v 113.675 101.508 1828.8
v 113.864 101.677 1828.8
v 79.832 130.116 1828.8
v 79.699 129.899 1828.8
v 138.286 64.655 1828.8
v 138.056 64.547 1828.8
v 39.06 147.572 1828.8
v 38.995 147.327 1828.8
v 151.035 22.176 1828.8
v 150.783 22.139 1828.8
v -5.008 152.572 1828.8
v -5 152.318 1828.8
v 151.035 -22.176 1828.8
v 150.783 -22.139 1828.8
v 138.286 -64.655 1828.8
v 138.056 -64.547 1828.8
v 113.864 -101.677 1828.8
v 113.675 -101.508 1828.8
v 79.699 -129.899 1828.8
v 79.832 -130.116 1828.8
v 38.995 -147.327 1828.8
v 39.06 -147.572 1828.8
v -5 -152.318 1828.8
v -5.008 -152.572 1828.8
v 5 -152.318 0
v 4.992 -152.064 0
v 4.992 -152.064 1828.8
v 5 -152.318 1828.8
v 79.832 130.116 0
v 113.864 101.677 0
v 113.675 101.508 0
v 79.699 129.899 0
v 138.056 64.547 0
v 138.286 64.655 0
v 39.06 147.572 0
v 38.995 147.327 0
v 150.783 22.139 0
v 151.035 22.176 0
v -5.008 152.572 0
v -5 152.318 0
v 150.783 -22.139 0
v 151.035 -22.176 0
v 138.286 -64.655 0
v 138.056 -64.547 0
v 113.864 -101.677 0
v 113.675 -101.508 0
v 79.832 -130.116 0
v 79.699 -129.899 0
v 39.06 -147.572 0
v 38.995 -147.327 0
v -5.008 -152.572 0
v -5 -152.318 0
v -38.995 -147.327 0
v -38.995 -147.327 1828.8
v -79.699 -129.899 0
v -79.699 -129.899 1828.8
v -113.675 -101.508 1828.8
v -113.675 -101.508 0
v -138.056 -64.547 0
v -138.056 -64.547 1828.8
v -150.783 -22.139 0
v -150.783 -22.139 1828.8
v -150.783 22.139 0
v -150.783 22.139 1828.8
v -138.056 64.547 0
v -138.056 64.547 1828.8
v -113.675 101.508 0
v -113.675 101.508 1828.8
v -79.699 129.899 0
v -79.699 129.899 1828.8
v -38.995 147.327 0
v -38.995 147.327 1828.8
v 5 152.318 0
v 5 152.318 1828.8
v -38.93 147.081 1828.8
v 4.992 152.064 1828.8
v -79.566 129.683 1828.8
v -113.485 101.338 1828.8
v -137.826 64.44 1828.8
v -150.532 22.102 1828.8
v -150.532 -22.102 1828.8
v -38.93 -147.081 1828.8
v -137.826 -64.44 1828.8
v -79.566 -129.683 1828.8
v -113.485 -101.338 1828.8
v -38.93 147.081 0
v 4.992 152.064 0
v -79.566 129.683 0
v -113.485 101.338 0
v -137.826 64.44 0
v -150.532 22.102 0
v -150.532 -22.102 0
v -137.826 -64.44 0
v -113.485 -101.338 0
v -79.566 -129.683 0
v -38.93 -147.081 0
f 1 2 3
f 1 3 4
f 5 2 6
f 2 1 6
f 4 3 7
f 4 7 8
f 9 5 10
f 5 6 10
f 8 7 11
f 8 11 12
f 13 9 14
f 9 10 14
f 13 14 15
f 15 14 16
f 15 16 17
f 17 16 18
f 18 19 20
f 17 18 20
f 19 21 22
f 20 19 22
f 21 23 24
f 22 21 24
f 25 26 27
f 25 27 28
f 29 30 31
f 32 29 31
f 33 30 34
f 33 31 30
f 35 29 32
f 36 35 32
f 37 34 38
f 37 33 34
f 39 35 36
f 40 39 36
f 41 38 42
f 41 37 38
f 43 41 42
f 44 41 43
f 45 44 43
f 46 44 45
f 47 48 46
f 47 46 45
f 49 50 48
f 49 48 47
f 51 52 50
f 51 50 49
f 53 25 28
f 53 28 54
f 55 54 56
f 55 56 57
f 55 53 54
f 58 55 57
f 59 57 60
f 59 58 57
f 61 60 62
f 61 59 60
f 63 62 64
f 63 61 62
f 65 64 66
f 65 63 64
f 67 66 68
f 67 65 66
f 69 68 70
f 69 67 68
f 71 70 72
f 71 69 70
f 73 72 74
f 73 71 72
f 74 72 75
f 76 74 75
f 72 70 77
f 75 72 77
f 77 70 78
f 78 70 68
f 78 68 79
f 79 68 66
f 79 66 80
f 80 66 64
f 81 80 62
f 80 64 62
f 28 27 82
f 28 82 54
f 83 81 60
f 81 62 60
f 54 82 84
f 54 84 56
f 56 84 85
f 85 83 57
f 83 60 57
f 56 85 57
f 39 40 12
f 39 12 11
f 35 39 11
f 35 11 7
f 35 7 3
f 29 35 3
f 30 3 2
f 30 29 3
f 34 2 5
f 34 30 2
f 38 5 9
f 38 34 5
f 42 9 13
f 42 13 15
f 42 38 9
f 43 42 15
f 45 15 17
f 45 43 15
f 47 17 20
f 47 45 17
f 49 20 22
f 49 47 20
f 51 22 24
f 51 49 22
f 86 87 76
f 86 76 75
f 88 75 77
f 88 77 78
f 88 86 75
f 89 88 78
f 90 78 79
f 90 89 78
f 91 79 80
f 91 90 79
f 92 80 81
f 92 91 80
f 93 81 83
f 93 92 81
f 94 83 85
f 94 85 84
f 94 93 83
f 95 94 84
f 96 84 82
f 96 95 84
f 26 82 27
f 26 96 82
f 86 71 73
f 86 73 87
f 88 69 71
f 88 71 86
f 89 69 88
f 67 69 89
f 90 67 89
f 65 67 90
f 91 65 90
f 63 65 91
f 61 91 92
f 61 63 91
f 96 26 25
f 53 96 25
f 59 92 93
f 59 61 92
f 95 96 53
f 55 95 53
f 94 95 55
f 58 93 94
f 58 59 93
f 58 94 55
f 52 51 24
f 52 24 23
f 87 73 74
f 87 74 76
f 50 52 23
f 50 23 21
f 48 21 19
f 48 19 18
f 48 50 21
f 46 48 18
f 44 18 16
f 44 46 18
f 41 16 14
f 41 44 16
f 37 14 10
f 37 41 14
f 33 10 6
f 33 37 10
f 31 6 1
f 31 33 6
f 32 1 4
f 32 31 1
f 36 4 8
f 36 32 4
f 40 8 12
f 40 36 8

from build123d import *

# Parameters (mm, degrees)
EXTRUDE_THIN4_DEPTH = 1828.8
EXTRUDE_THIN5_DEPTH = 1828.8


with BuildPart() as part:
    # Sketch4 → Extrude-Thin4 (new body)
    with BuildSketch(Plane(origin=(0, 0, 0), x_dir=(0, 1, 0), z_dir=(0, 0, 1))):
        with BuildLine():
            ThreePointArc((-152.317956919, -5), (0, 152.4), (152.317956919, -5))
            Line((152.317956919, -5), (152.064093658, -4.991666667))
            ThreePointArc((152.064093658, -4.991666667), (0, 152.146), (-152.064093658, -4.991666667))
            Line((-152.064093658, -4.991666667), (-152.317956919, -5))
        make_face()
    extrude(amount=EXTRUDE_THIN4_DEPTH)


with BuildPart() as body_2:
    # Sketch4<4> → Extrude-Thin5 (new body)
    with BuildSketch(Plane(origin=(0, 0, 0), x_dir=(0, 1, 0), z_dir=(0, 0, 1))):
        with BuildLine():
            ThreePointArc((-152.317956919, 5), (0, -152.4), (152.317956919, 5))
            Line((152.317956919, 5), (152.571820181, 5.008333333))
            ThreePointArc((152.571820181, 5.008333333), (0, -152.654), (-152.571820181, 5.008333333))
            Line((-152.571820181, 5.008333333), (-152.317956919, 5))
        make_face()
    extrude(amount=EXTRUDE_THIN5_DEPTH)


solid = Compound([part.part, body_2.part])
